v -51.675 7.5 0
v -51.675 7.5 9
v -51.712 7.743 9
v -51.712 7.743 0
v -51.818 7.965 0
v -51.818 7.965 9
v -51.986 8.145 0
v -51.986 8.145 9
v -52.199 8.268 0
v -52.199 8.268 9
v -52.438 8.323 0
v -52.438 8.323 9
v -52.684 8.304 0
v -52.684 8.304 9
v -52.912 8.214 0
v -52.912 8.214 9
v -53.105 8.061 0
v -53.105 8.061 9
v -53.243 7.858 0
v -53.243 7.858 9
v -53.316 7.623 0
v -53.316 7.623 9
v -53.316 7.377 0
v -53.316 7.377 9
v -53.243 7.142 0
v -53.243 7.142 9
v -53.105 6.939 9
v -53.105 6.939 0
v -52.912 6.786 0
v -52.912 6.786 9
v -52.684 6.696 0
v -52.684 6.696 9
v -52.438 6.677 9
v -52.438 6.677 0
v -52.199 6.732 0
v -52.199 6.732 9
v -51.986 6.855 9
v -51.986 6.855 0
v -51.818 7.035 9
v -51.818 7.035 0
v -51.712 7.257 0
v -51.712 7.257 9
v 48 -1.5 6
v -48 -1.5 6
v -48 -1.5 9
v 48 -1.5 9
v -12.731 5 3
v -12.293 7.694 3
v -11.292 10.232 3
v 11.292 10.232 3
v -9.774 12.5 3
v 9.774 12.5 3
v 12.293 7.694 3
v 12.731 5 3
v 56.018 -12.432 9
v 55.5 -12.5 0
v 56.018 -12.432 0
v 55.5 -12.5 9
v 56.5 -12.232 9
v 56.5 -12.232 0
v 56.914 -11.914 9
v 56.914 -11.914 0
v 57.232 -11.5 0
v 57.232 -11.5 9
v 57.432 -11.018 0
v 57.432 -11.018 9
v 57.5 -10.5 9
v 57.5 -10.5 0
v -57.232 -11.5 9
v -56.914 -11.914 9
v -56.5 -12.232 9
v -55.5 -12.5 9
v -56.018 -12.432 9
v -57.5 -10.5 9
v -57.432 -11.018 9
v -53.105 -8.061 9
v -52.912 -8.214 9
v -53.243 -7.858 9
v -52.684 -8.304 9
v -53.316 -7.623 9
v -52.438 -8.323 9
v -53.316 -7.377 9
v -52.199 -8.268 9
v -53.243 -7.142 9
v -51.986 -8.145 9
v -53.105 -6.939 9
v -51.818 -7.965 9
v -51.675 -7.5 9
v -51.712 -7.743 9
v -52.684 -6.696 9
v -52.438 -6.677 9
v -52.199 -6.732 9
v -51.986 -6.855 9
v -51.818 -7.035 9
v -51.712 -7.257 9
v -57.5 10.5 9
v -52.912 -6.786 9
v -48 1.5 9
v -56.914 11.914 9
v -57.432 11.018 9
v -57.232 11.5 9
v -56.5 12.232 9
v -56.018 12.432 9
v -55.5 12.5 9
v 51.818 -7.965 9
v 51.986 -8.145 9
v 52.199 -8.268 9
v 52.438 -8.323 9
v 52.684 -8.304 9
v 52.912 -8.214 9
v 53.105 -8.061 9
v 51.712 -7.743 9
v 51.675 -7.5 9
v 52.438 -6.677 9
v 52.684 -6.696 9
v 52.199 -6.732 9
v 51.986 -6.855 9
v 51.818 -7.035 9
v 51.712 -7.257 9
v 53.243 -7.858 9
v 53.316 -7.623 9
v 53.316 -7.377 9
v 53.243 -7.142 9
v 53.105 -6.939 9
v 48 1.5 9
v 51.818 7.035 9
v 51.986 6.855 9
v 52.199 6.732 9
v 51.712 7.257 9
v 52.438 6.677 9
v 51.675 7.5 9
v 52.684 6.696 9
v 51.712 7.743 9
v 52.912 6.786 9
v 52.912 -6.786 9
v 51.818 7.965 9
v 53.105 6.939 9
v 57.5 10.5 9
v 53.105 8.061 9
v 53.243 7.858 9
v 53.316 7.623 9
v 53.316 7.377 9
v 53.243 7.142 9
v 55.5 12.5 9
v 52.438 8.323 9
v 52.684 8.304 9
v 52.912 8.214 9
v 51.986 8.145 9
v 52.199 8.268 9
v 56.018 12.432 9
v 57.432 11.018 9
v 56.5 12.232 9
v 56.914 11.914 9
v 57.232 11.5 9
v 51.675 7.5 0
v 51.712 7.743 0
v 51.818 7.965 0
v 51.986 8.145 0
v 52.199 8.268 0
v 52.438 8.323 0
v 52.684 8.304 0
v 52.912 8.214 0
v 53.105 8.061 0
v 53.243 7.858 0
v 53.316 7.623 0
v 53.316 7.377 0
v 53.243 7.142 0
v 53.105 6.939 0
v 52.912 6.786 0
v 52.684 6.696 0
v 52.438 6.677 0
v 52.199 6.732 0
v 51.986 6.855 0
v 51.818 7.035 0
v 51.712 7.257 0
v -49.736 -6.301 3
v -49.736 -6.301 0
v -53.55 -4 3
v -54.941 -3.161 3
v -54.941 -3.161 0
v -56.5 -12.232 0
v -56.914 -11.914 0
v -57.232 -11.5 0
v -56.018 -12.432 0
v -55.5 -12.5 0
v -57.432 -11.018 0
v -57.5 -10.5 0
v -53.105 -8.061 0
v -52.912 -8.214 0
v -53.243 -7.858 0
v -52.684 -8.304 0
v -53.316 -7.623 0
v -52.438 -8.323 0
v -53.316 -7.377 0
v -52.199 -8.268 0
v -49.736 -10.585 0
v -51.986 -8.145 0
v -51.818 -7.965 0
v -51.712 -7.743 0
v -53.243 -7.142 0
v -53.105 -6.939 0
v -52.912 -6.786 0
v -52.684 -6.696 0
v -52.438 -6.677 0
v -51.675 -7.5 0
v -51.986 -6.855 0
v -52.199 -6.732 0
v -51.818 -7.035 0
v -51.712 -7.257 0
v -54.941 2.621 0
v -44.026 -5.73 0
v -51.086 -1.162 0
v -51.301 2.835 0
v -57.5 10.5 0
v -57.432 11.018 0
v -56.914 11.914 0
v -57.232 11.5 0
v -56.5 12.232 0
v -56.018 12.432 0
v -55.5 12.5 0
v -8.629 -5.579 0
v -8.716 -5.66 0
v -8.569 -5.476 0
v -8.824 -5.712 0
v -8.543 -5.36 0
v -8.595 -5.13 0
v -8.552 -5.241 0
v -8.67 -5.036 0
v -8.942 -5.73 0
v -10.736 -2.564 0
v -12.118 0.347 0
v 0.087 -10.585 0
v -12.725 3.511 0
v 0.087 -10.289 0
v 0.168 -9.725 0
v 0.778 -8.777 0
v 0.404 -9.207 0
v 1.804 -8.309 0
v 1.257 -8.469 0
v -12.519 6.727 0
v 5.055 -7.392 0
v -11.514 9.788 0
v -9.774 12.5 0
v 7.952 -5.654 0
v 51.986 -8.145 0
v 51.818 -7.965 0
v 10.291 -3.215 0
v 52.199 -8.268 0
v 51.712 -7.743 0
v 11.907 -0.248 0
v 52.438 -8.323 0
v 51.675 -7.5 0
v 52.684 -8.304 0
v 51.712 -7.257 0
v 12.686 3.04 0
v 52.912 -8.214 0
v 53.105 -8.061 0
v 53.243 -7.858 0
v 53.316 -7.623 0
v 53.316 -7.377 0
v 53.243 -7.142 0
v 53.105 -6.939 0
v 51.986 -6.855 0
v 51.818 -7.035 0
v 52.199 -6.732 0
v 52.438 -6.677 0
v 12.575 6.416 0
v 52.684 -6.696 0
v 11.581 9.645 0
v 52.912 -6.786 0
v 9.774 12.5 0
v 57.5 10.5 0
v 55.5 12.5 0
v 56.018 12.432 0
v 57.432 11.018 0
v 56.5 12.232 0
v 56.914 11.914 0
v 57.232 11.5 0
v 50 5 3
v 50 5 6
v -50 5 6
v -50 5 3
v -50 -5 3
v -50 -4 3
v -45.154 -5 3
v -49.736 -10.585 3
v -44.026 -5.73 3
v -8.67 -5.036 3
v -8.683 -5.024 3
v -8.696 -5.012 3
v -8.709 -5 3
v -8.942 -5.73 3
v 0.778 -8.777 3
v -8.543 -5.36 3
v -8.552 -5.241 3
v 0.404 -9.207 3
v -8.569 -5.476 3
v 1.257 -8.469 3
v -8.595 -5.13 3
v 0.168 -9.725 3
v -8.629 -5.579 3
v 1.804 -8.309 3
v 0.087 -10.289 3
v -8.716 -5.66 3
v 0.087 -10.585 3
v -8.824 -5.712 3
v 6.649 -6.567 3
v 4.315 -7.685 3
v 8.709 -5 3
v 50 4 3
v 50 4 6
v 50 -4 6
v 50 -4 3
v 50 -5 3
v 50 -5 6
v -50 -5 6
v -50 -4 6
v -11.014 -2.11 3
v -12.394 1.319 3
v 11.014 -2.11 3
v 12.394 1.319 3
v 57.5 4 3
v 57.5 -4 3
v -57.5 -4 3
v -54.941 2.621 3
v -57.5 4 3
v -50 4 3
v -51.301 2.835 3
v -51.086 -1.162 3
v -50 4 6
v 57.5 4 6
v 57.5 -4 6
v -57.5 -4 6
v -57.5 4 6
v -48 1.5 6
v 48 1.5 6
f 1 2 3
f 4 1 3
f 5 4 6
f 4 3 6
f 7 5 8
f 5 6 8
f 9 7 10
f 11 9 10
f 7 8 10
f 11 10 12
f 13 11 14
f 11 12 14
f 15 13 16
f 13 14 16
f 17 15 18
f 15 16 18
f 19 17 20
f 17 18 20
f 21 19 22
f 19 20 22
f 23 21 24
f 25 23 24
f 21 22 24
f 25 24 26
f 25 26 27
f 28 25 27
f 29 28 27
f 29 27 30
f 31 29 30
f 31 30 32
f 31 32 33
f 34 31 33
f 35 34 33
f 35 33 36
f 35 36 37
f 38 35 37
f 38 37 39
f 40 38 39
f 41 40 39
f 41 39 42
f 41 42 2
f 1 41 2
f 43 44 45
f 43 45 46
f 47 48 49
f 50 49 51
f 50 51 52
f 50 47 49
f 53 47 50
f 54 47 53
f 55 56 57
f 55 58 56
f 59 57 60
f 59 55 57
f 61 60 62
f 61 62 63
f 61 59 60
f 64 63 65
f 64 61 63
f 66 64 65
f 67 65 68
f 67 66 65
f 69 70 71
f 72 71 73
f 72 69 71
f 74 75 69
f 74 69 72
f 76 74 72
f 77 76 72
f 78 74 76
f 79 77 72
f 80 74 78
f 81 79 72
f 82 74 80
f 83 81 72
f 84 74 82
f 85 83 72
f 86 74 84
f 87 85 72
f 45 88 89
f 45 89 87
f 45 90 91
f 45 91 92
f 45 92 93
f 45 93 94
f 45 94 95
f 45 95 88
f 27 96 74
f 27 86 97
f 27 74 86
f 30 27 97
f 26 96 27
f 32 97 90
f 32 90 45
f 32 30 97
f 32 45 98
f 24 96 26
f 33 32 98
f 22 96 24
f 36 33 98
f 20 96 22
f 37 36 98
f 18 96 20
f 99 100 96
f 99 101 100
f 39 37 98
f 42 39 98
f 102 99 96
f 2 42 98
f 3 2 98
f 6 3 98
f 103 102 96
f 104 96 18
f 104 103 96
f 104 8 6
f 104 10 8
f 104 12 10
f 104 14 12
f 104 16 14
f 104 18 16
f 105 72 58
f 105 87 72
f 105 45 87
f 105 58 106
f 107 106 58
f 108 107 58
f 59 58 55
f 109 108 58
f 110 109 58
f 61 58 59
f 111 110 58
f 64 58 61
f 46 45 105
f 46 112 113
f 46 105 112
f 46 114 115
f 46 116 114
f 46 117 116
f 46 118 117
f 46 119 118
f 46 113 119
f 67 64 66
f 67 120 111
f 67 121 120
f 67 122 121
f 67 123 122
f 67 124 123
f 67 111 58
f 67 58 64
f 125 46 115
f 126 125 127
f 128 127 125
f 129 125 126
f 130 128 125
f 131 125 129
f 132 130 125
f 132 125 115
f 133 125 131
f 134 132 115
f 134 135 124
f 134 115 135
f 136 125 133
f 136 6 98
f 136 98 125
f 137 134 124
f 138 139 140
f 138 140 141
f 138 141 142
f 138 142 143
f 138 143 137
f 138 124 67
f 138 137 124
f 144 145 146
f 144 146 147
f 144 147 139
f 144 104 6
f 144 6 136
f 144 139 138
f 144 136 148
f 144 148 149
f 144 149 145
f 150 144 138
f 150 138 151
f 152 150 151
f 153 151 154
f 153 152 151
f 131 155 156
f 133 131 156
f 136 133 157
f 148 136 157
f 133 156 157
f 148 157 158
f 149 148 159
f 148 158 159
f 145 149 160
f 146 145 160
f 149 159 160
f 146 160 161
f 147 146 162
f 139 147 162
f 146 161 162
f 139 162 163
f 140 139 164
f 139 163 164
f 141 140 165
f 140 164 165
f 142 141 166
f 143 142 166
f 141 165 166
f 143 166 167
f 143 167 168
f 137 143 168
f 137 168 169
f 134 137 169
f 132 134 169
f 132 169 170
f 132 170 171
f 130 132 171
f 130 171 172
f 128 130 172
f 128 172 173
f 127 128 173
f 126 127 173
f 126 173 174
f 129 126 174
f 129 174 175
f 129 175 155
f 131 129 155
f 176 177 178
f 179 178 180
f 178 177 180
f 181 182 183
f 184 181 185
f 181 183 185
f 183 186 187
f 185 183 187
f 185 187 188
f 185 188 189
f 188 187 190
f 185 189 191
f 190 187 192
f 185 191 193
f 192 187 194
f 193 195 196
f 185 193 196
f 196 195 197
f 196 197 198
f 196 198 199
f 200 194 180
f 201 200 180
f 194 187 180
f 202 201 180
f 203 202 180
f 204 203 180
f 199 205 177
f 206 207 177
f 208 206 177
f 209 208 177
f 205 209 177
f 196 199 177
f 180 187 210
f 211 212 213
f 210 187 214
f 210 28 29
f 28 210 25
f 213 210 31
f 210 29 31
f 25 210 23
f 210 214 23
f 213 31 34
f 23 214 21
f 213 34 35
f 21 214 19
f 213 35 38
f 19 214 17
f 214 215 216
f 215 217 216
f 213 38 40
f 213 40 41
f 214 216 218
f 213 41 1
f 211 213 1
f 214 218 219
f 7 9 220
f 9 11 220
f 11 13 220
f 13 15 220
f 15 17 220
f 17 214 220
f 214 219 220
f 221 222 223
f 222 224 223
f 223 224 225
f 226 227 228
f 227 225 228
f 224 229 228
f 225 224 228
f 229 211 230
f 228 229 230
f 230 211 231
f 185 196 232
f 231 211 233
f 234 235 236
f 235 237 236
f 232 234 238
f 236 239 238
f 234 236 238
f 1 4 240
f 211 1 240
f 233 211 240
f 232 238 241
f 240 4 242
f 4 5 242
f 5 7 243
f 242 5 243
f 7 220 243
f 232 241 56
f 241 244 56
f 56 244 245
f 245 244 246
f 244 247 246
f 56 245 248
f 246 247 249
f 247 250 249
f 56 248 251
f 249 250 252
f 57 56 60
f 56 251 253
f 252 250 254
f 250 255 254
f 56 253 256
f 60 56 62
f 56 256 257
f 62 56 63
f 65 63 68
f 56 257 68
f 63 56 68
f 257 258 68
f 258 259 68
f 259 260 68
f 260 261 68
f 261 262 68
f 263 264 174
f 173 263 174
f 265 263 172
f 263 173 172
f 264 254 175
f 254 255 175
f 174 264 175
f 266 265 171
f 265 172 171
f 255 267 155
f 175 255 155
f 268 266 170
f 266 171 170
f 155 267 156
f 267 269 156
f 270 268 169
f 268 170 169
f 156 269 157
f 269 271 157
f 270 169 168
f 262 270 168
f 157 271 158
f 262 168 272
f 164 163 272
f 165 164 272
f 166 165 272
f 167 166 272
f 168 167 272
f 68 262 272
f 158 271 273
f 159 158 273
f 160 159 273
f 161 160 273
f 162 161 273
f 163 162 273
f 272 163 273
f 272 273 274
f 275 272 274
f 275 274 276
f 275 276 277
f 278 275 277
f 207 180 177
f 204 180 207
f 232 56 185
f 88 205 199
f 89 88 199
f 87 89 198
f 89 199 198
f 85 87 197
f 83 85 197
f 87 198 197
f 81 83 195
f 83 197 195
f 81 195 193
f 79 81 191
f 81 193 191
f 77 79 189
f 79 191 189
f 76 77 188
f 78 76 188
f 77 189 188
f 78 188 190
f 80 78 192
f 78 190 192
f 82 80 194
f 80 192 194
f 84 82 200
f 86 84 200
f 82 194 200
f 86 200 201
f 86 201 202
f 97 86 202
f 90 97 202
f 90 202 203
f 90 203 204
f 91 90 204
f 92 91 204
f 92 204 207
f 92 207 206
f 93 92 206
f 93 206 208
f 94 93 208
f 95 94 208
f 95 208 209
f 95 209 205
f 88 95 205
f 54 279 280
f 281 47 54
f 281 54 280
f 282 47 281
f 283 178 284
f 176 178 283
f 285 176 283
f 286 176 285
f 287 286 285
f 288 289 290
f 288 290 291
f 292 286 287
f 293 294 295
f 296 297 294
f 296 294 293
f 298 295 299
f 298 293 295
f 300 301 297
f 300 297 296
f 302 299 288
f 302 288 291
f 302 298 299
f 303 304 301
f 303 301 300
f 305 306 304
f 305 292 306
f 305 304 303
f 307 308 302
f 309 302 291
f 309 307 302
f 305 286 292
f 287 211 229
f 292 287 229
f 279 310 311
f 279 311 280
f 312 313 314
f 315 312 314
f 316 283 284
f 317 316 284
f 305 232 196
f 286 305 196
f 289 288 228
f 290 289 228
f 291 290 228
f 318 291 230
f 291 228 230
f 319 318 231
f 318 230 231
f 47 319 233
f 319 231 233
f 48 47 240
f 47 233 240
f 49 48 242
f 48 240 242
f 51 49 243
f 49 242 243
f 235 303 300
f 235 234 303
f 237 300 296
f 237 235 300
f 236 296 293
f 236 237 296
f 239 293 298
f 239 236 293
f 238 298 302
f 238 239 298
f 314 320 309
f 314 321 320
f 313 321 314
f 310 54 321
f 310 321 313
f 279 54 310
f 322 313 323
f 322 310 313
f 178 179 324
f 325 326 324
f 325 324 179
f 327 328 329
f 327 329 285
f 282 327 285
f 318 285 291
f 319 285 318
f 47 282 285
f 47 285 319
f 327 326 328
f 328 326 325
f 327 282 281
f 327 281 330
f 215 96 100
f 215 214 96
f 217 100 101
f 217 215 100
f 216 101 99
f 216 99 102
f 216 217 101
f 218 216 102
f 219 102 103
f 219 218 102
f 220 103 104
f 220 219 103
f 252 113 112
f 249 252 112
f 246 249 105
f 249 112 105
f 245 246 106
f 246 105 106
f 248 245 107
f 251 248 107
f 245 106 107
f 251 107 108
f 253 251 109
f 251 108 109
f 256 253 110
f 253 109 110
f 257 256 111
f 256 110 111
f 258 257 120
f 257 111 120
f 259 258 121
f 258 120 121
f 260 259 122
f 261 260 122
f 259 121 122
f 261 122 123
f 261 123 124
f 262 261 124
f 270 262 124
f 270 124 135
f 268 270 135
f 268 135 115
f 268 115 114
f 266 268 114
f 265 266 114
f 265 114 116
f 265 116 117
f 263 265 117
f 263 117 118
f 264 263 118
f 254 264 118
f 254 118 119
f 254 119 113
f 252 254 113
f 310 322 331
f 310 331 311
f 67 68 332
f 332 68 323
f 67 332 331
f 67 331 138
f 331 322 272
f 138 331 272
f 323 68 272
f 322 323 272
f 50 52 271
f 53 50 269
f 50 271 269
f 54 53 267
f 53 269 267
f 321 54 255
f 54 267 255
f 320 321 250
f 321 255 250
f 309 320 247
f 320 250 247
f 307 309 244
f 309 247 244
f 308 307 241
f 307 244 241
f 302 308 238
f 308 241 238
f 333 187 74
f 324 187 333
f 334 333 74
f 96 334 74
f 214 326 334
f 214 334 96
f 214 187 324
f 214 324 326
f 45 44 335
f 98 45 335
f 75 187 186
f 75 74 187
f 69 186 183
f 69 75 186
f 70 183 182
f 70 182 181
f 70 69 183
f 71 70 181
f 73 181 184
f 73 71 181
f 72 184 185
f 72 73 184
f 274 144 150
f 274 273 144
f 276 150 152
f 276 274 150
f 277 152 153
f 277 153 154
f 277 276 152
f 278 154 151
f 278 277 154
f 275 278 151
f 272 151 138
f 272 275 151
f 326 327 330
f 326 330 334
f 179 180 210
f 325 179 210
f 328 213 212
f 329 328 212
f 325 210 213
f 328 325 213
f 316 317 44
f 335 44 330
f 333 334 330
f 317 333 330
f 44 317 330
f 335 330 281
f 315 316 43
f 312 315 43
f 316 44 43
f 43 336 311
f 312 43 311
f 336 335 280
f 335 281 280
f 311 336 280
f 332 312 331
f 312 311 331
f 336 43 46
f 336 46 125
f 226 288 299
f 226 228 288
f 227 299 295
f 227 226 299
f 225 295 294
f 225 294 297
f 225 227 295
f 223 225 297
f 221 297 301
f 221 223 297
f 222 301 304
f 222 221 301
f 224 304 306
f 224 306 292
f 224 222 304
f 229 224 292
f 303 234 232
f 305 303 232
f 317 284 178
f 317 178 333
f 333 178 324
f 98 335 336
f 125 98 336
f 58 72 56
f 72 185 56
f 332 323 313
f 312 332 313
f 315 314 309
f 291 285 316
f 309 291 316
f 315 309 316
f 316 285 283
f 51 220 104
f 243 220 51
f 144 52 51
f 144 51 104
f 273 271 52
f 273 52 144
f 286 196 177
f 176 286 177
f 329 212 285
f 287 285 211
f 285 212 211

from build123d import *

# Parameters (mm, degrees)
SKETCH_W              = 115
SKETCH_H              = 25
PAD_DEPTH             = 3
PAD001_DEPTH          = 3
SKETCH002_W           = 115
SKETCH002_H           = 25
SKETCH002_W_2         = 96
SKETCH002_H_2         = 3
PAD002_DEPTH          = 3
SKETCH003_R           = 0.825
POCKET_DEPTH          = 245.060315
POLARPATTERN_COUNT    = 2
POLARPATTERN001_COUNT = 2
POLARPATTERN002_COUNT = 2
FILLET_R              = 2
SKETCH004_R           = 12.75
POCKET001_DEPTH       = 3
POCKET002_DEPTH       = 3
FILLET001_R           = 0.4
FILLET002_R           = 2


with BuildPart() as part:
    # Sketch → Pad (new body)
    with BuildSketch(Plane.XY):
        Rectangle(SKETCH_W, SKETCH_H)
    extrude(amount=PAD_DEPTH)

    # Sketch001 (on Face6 of Pad) → Pad001 (join)
    with BuildSketch(Plane.XY.offset(3)):
        Polygon((-57.5, 12.5), (57.5, 12.5), (57.5, 4), (50, 4), (50, 5), (-50, 5), (-50, 4), (-57.5, 4), align=None)
        Polygon((-57.5, -12.5), (57.5, -12.5), (57.5, -4), (50, -4), (50, -5), (-50, -5), (-50, -4), (-57.5, -4), align=None)
    extrude(amount=PAD001_DEPTH)

    # Sketch002 (on Face12 of Pad001) → Pad002 (join)
    with BuildSketch(Plane.XY.offset(6)):
        Rectangle(SKETCH002_W, SKETCH002_H)
        Rectangle(SKETCH002_W_2, SKETCH002_H_2, mode=Mode.SUBTRACT)
    extrude(amount=PAD002_DEPTH)

    # Sketch003 (on Face26 of Pad002) → Pocket (cut, through all)
    with BuildSketch(Plane.XY.offset(9)):
        with Locations((-52.5, 7.5)):
            Circle(SKETCH003_R)
    pocket = extrude(amount=-POCKET_DEPTH, mode=Mode.SUBTRACT)

    # PolarPattern: Pocket ×2 about axis
    polarpattern_axis = Axis((0, 0, 0), (0, 1, 0))
    for i in range(1, POLARPATTERN_COUNT):
        add(pocket.rotate(polarpattern_axis, i * 360 / POLARPATTERN_COUNT), mode=Mode.SUBTRACT)

    # PolarPattern001: Pocket ×2 about axis
    polarpattern001_axis = Axis((0, 0, 0), (1, 0, 0))
    for i in range(1, POLARPATTERN001_COUNT):
        add(pocket.rotate(polarpattern001_axis, i * 360 / POLARPATTERN001_COUNT), mode=Mode.SUBTRACT)

    # PolarPattern002: Pocket ×2 about axis
    polarpattern002_axis = Axis((0, 0, 9), (0, 0, 1))
    for i in range(1, POLARPATTERN002_COUNT):
        add(pocket.rotate(polarpattern002_axis, i * 360 / POLARPATTERN002_COUNT), mode=Mode.SUBTRACT)

    # Fillet
    fillet_edges = [part.edges().sort_by_distance(p)[0] for p in [
        (57.5, 12.5, 7.5),
        (57.5, 12.5, 4.5),
        (57.5, 12.5, 1.5),
        (57.5, -12.5, 7.5),
        (-57.5, 12.5, 7.5),
        (-57.5, -12.5, 7.5),
    ]]
    fillet(fillet_edges, radius=FILLET_R)

    # Sketch004 (on Face2 of Fillet) → Pocket001 (cut)
    with BuildSketch(Plane(origin=(0, 0, 0), x_dir=(1, 0, 0), z_dir=(0, 0, -1))):
        with Locations((0, -4.31247)):
            Circle(SKETCH004_R)
    extrude(amount=-POCKET001_DEPTH, mode=Mode.SUBTRACT)

    # Sketch005 (on Face2 of Pocket001) → Pocket002 (cut)
    with BuildSketch(Plane(origin=(0, 0, 0), x_dir=(1, 0, 0), z_dir=(0, 0, -1))):
        Polygon((0.086598, 10.584693), (-49.736099, 10.584693), (-49.736099, 6.30074), (-54.94091, 3.161258), (-54.94091, -2.621142), (-51.300568, -2.835279), (-51.086433, 1.161956), (-44.025761, 5.729707), (0.086598, 5.729707), align=None)
    extrude(amount=-POCKET002_DEPTH, mode=Mode.SUBTRACT)

    # Fillet001
    fillet001_edges = [part.edges().sort_by_distance(p)[0] for p in [
        (-7.856028, -5.729707, 1.5),
    ]]
    fillet(fillet001_edges, radius=FILLET001_R)

    # Fillet002
    fillet002_edges = [part.edges().sort_by_distance(p)[0] for p in [
        (0.086598, -8.437236, 1.5),
    ]]
    fillet(fillet002_edges, radius=FILLET002_R)


solid = part.part
